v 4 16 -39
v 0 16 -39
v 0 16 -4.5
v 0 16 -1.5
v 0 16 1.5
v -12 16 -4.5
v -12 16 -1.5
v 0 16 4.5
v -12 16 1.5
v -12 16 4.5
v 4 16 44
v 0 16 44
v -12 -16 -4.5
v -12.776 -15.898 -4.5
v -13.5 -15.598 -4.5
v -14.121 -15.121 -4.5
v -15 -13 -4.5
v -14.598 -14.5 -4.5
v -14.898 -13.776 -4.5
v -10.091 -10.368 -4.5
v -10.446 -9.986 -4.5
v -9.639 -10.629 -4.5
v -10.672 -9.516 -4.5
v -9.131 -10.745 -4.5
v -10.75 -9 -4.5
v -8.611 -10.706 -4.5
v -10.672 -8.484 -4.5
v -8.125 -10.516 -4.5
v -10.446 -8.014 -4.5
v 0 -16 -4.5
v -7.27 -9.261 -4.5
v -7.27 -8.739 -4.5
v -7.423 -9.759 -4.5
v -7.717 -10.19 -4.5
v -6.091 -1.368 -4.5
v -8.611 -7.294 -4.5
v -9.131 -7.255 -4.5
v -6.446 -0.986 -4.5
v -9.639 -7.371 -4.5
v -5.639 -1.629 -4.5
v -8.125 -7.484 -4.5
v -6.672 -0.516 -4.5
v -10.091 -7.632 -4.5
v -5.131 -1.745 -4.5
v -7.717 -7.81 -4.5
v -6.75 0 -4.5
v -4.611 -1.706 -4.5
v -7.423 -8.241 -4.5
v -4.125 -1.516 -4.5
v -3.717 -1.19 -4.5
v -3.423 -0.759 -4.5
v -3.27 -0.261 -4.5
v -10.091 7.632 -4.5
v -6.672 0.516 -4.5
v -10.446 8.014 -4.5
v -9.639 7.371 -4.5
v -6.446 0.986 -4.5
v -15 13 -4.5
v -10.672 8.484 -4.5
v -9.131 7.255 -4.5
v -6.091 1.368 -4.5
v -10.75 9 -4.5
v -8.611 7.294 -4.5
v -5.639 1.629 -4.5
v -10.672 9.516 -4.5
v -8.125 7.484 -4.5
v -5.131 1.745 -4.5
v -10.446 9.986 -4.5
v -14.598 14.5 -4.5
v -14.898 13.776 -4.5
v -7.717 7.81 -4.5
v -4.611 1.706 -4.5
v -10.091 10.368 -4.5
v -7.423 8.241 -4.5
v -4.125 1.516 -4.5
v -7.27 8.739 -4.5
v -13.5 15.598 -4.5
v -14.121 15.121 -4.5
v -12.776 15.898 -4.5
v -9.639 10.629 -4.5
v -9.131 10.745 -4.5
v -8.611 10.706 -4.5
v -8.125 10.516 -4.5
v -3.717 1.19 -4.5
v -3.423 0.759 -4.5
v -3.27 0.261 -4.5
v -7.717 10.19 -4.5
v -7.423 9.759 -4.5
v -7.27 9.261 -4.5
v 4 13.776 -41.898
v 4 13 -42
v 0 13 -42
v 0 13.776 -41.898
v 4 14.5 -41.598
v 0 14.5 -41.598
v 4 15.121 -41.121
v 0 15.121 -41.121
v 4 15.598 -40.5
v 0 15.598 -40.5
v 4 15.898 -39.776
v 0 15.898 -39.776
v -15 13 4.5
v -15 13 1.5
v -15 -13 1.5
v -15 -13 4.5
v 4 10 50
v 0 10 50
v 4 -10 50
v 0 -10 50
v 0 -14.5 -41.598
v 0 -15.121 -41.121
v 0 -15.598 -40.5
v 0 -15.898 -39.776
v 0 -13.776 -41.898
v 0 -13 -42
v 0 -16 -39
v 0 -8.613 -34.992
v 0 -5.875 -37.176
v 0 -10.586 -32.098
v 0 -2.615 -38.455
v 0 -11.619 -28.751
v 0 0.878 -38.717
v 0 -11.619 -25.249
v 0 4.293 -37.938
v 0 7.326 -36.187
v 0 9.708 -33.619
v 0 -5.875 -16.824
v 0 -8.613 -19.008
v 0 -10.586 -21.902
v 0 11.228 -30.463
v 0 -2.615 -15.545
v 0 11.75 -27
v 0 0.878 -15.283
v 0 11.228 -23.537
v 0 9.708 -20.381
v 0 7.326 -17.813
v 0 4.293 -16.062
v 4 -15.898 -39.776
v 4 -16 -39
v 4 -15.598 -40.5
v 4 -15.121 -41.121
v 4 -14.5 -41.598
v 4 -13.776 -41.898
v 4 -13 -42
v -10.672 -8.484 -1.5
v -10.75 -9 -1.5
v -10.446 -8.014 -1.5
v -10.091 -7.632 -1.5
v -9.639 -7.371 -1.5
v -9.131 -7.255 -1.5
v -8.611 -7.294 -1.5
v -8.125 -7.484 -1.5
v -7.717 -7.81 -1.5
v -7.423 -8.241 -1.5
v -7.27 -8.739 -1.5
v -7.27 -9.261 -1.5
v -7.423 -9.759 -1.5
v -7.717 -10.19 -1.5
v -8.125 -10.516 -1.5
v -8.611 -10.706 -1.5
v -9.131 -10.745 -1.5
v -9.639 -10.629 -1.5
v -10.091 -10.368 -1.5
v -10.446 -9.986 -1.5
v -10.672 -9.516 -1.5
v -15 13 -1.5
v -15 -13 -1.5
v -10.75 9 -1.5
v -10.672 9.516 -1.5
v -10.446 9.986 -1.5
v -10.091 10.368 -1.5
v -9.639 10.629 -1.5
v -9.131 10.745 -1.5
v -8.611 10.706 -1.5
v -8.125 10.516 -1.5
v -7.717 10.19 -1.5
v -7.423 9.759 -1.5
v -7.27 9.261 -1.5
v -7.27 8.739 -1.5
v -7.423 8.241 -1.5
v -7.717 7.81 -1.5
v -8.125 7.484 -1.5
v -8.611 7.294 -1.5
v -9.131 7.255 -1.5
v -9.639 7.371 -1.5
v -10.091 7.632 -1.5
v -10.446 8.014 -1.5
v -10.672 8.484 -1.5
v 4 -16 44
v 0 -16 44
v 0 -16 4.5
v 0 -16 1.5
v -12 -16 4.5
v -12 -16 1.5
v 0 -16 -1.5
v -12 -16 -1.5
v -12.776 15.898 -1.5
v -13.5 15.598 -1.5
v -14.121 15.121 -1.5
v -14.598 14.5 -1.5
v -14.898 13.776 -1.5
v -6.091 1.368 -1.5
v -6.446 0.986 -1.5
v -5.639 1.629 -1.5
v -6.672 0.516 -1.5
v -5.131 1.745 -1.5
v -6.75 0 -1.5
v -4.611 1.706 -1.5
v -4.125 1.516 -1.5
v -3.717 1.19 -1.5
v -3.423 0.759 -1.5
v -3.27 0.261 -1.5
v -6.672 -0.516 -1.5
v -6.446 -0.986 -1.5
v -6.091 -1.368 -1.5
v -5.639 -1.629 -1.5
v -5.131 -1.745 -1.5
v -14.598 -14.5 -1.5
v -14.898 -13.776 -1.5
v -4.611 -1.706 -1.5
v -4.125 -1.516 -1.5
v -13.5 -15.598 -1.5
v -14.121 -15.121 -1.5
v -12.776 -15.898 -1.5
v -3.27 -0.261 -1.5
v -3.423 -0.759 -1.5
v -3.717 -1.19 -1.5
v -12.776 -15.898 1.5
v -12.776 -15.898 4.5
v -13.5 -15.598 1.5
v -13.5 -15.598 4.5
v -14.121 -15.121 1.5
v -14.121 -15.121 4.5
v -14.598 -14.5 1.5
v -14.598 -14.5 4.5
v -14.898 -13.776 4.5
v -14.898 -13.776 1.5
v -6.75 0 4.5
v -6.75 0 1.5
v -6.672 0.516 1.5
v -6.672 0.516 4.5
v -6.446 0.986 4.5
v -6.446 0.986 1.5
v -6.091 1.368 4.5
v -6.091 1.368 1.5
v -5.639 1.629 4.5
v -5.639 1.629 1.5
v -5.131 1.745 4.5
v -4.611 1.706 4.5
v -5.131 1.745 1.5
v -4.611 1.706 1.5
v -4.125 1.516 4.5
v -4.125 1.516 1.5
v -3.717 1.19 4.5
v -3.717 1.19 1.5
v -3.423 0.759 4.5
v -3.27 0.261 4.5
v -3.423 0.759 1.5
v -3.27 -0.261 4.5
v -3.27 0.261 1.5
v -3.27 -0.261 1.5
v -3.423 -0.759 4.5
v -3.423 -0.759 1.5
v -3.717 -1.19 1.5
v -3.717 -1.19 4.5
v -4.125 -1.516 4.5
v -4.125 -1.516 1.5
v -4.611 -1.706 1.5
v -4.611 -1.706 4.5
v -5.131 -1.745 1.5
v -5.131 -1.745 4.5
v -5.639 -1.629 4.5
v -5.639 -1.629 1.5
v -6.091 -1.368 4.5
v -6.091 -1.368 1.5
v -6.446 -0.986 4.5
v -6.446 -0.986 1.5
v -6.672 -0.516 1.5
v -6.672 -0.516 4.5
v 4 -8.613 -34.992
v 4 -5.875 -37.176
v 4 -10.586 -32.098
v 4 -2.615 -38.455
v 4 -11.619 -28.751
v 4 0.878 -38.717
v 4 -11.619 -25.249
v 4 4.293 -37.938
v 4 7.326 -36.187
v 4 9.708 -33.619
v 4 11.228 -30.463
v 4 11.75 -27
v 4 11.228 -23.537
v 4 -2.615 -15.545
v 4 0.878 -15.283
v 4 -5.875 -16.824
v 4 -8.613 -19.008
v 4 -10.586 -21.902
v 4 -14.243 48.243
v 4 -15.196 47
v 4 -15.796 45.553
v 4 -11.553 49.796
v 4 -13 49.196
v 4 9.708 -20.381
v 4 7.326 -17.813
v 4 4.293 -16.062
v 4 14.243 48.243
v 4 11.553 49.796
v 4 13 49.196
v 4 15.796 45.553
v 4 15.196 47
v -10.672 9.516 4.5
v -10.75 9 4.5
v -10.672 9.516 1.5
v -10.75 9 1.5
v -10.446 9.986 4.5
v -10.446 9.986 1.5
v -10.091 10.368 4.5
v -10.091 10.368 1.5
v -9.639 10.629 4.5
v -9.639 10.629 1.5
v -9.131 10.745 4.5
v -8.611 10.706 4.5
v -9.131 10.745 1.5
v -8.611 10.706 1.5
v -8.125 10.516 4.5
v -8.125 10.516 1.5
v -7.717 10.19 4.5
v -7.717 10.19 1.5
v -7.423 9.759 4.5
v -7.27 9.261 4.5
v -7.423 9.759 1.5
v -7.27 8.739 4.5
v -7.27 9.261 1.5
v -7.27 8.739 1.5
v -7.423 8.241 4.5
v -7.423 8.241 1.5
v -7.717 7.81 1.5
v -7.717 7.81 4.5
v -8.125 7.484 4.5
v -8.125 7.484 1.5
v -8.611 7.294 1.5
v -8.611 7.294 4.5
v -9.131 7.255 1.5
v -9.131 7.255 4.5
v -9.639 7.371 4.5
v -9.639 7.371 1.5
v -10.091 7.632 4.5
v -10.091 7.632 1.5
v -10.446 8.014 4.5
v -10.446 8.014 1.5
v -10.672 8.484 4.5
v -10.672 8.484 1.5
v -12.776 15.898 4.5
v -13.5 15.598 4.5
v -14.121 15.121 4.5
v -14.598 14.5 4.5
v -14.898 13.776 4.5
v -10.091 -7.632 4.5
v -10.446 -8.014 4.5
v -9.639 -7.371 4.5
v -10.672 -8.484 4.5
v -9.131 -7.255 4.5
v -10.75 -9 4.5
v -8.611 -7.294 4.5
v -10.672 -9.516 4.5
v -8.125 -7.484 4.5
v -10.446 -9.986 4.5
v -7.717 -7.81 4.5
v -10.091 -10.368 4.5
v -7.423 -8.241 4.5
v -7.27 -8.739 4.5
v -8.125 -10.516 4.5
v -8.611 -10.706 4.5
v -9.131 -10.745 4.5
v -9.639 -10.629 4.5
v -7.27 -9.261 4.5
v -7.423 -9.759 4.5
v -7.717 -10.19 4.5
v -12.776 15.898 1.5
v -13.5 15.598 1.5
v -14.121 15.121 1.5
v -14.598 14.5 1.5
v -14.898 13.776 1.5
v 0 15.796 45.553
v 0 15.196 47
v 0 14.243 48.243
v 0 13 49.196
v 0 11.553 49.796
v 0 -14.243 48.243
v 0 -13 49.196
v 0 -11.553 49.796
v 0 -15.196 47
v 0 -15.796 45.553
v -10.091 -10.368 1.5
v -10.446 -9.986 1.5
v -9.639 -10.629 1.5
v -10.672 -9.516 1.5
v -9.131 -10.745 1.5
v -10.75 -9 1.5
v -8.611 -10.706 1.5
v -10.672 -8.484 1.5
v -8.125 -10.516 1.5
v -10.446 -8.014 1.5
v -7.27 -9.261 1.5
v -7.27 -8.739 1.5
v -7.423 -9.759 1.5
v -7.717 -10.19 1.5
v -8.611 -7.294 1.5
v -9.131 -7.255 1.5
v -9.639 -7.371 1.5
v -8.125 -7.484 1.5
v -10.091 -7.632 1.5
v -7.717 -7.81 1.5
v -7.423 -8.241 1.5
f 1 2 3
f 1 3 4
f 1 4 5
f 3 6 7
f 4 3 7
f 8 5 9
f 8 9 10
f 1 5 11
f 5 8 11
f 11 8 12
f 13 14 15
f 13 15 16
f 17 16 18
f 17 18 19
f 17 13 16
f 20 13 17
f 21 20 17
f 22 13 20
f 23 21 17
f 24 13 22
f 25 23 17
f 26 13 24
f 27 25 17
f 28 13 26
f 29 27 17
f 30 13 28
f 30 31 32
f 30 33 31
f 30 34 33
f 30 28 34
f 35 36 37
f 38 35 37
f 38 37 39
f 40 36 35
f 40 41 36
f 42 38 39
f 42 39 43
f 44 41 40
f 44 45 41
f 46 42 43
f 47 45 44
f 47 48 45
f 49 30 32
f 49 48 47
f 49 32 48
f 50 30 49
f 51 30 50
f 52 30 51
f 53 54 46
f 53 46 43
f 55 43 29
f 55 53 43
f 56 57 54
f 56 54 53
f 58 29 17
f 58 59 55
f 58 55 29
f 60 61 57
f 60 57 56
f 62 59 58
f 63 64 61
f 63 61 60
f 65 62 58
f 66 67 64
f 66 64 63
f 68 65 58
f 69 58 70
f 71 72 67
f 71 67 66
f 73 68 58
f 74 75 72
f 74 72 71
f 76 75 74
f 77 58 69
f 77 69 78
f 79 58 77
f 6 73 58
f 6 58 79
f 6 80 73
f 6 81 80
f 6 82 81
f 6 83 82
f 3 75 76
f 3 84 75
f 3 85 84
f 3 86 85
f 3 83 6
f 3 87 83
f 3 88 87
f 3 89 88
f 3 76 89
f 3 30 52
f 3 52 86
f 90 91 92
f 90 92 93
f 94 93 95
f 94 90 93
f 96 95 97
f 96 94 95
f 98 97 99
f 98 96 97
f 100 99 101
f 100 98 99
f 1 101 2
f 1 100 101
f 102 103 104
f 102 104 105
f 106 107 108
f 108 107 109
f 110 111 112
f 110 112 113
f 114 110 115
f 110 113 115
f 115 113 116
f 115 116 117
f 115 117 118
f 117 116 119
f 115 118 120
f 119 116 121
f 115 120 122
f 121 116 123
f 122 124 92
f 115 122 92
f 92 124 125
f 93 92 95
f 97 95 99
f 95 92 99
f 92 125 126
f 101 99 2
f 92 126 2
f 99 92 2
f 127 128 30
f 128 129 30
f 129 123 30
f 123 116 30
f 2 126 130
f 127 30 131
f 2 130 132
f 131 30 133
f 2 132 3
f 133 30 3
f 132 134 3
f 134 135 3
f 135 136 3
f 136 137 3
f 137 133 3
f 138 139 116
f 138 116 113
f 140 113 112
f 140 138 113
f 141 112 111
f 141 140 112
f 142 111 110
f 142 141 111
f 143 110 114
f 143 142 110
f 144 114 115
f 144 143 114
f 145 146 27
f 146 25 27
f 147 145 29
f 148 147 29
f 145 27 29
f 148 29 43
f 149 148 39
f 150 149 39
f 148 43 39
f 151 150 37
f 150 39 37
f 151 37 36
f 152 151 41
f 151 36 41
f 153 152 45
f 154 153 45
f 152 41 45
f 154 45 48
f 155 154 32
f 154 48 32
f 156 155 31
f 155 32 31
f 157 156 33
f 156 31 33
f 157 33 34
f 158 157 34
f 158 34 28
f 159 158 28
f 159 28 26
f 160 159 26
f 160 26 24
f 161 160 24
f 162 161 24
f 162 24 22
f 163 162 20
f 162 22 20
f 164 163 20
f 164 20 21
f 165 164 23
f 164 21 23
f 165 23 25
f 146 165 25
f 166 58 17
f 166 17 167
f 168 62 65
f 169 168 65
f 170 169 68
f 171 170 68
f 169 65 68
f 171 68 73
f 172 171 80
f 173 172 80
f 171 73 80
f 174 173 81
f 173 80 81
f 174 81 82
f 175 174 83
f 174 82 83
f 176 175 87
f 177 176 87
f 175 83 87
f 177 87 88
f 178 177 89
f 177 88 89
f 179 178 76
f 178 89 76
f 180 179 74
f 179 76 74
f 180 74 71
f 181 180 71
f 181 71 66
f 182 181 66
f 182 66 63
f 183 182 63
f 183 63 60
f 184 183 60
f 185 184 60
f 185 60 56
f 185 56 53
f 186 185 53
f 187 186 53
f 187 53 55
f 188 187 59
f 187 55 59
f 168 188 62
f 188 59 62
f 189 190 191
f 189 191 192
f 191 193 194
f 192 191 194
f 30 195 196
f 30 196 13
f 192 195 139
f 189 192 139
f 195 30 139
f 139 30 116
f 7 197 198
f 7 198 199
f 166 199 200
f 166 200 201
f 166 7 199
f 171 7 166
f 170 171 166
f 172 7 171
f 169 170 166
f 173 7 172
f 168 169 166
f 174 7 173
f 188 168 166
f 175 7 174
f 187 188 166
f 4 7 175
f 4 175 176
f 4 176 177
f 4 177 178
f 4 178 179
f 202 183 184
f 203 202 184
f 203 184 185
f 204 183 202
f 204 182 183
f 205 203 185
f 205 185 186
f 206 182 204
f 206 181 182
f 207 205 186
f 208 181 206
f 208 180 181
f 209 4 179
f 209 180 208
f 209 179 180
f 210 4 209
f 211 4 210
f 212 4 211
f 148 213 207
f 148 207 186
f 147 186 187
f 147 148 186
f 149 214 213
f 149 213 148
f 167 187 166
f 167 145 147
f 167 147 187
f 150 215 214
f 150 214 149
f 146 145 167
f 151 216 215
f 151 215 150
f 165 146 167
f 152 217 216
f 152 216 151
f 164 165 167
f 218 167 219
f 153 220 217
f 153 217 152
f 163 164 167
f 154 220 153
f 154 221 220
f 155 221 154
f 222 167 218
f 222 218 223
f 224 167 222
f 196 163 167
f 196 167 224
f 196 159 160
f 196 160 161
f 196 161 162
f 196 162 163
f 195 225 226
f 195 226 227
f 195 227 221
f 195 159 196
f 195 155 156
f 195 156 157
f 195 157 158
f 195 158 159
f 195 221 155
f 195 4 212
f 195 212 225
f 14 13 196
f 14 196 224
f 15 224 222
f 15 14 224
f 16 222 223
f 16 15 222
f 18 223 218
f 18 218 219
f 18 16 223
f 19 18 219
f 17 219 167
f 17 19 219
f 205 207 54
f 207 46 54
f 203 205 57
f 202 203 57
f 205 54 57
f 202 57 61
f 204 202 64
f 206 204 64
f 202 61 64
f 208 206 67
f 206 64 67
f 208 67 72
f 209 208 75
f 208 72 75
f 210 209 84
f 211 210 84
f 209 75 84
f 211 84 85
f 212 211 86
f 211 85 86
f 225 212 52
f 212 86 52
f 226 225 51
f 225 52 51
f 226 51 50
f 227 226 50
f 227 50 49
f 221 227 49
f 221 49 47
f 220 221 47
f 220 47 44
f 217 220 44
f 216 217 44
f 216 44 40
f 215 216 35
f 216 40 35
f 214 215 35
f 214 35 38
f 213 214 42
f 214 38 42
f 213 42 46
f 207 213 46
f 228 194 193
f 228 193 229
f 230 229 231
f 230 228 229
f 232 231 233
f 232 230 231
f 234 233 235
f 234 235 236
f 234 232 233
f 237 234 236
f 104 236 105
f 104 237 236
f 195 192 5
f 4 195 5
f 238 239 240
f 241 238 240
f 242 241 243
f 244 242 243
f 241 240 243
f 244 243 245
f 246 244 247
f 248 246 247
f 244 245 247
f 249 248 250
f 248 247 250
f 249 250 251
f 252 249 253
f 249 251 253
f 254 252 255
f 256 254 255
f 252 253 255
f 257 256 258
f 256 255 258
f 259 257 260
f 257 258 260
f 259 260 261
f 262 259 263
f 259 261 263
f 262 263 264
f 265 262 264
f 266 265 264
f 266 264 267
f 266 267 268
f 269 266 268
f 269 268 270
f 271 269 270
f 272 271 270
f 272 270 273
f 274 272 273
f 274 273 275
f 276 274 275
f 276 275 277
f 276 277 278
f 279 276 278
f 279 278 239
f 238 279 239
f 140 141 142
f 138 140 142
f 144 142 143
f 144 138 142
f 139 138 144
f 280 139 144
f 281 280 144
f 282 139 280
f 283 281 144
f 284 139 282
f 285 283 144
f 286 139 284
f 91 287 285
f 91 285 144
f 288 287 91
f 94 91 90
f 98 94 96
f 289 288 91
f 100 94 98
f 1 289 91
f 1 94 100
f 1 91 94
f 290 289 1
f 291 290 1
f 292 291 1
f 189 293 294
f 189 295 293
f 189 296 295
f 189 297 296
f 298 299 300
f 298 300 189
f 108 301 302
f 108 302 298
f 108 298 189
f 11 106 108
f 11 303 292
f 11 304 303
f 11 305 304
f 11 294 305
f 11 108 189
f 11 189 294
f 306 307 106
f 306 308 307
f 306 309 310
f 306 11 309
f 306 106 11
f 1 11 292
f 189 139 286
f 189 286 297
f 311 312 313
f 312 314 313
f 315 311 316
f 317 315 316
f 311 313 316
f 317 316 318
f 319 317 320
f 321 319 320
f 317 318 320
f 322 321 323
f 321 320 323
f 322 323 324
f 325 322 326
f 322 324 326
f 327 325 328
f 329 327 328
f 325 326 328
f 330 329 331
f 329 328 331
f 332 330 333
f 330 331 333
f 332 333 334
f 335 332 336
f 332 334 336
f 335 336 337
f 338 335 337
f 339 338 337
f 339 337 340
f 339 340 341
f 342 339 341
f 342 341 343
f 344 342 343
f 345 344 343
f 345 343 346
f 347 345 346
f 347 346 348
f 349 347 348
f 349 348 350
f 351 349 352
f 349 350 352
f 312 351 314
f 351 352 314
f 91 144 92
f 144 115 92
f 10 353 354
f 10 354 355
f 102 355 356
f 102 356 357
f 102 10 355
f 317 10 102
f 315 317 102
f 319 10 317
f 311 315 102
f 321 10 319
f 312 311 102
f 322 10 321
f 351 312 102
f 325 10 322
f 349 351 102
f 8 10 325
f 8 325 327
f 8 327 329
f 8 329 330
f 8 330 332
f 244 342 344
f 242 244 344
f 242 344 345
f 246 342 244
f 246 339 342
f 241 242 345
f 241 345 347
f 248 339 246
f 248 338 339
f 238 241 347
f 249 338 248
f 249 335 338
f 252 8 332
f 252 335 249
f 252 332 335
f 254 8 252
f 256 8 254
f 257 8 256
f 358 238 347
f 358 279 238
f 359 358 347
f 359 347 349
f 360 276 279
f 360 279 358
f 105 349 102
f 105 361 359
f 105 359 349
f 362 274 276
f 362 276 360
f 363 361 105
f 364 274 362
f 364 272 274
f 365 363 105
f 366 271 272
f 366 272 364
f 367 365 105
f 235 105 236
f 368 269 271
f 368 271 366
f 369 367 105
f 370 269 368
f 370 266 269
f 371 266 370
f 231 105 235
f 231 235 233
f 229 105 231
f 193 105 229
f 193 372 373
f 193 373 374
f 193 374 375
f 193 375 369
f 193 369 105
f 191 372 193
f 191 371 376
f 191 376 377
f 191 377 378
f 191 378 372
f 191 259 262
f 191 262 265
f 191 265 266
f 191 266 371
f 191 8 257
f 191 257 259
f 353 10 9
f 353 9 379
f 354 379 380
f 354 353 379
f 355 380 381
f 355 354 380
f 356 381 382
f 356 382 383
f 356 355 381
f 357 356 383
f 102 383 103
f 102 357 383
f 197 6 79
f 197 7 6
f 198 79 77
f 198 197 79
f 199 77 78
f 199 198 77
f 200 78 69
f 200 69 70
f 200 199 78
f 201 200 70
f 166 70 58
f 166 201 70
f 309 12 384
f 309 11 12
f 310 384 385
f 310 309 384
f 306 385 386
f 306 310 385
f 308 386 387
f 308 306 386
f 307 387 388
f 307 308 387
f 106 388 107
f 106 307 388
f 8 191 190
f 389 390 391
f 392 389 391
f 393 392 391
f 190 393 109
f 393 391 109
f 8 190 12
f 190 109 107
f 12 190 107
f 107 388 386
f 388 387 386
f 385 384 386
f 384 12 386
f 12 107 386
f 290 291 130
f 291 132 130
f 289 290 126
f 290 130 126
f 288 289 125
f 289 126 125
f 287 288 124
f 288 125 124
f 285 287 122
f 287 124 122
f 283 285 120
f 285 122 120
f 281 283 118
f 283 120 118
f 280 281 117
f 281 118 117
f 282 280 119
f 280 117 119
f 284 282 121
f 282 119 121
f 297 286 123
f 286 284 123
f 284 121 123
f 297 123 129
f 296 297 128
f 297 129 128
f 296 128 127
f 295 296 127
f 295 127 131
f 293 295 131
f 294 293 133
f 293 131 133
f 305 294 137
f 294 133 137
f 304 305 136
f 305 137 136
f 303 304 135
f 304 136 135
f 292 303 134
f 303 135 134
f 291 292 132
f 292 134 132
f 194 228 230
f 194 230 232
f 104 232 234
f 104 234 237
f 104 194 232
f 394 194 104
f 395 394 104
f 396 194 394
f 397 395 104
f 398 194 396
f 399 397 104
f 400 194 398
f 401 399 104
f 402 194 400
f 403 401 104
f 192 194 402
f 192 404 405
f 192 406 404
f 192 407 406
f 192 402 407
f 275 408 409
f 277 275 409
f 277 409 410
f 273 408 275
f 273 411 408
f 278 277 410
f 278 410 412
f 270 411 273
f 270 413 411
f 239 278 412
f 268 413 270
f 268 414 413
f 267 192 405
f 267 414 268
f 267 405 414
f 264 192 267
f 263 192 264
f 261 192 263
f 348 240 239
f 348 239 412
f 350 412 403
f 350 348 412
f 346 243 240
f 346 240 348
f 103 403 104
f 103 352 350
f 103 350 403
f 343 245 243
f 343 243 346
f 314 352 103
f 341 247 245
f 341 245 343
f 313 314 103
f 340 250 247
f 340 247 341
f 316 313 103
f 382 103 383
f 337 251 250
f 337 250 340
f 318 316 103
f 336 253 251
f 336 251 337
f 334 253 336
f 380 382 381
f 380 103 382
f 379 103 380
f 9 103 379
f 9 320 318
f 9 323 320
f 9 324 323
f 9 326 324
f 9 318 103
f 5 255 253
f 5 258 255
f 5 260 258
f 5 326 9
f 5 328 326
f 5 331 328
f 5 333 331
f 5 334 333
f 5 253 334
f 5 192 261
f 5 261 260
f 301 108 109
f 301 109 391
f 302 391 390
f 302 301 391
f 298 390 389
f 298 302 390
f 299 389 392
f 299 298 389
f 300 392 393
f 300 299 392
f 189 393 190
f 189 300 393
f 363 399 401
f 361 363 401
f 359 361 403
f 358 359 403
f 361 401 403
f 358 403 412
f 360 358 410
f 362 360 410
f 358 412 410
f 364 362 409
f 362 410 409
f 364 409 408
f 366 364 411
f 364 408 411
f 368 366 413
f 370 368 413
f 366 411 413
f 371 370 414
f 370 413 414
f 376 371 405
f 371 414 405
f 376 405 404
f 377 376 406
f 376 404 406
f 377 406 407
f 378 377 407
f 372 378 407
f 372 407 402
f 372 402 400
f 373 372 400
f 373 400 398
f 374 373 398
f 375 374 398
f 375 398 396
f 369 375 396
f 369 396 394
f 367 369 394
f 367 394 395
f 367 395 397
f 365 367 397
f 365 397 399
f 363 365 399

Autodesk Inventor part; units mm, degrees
ref_plane "YZ Plane" through (0, 0, 0) normal (1, 0, 0) x (0, 1, 0)
ref_plane "XZ Plane" through (0, 0, 0) normal (0, 1, 0) x (-1, 0, 0)
ref_plane "XY Plane" through (0, 0, 0) normal (0, 0, 1) x (1, 0, 0)
sketch "Sketch1" plane through (0, 0, 0) normal (1, 0, 0) x (0, 1, 0)
  line L0 (16, 50) -> (-16, 50)
  line L1 (-16, 50) -> (-16, -42)
  line L2 (-16, -42) -> (16, -42)
  line L3 (16, -42) -> (16, 50)
  circle A0 centre (0, -27) radius 11.75
  line L4 (0, 0) -> (0, -82.2599) construction
  dimension "d0" = 23.5
  dimension "d1" = 27
  dimension "d2" = 50
  dimension "d3" = 32
  dimension "d5" = 42
extrude "Extrusion1" add sketch "Sketch1" along normal blind 4
fillet "Fillet1" radius 3 2 edges at (2, -16, -42) (2, 16, -42)
fillet "Fillet2" radius 6 1 edges at (2, -16, 50)
fillet "Fillet3" radius 6 1 edges at (2, 16, 50)
sketch "Sketch2" plane through (0, 0, 0) normal (-1, 0, 0) x (0, 0, 1)
  line L0 (44, -16) -> (-39, -16) projected
  line L1 (-39, 16) -> (44, 16) projected
  line L2 (-1.5, -16) -> (-4.5, -16)
  line L3 (-4.5, -16) -> (-4.5, 16)
  line L4 (-4.5, 16) -> (-1.5, 16)
  line L5 (-1.5, 16) -> (-1.5, -16)
  line L6 (1.5, 16) -> (4.5, 16)
  line L7 (4.5, 16) -> (4.5, -16)
  line L8 (4.5, -16) -> (1.5, -16)
  line L9 (1.5, -16) -> (1.5, 16)
  line L10 (0, -16) -> (0, 16) construction
  point P0 (0, 0)
  point P1 (-1.5, 16)
  point P2 (1.5, 16)
  point P3 (1.5, -16)
  point P4 (4.5, -16)
  dimension "d11" = 3
  dimension "d12" = 3
  dimension "d13" = 3
extrude "Extrusion2" add sketch "Sketch2" along normal blind 15 contours L0 L9 L1 L7 | L0 L3 L1 L5
fillet "Fillet4" radius 3 4 edges at (-15, -16, 3) (-15, -16, -3) (-15, 16, 3) (-15, 16, -3)
sketch "Sketch3" plane through (0, -16, -4.5) normal (0, 0, -1) x (-1, 0, 0)
  circle A0 centre (9, 7) radius 1.75
  circle A1 centre (9, 25) radius 1.75
  line L0 (0, 0) -> (12, 0) projected
  line L1 (0, 32) -> (12, 32) projected
  line L2 (15, 29) -> (15, 3) projected
  circle A2 centre (5, 16) radius 1.75
  point P0 (0, 16)
  dimension "d17" = 3.5
  dimension "d18" = 3.5
  dimension "d19" = 7
  dimension "d20" = 7
  dimension "d21" = 6
  dimension "d22" = 6
  dimension "d23" = 16
  dimension "d24" = 10
  dimension "d25" = 3.5
extrude "Extrusion3" cut sketch "Sketch3" against normal blind 15
properties part number "POUPLY_P5_V2"
